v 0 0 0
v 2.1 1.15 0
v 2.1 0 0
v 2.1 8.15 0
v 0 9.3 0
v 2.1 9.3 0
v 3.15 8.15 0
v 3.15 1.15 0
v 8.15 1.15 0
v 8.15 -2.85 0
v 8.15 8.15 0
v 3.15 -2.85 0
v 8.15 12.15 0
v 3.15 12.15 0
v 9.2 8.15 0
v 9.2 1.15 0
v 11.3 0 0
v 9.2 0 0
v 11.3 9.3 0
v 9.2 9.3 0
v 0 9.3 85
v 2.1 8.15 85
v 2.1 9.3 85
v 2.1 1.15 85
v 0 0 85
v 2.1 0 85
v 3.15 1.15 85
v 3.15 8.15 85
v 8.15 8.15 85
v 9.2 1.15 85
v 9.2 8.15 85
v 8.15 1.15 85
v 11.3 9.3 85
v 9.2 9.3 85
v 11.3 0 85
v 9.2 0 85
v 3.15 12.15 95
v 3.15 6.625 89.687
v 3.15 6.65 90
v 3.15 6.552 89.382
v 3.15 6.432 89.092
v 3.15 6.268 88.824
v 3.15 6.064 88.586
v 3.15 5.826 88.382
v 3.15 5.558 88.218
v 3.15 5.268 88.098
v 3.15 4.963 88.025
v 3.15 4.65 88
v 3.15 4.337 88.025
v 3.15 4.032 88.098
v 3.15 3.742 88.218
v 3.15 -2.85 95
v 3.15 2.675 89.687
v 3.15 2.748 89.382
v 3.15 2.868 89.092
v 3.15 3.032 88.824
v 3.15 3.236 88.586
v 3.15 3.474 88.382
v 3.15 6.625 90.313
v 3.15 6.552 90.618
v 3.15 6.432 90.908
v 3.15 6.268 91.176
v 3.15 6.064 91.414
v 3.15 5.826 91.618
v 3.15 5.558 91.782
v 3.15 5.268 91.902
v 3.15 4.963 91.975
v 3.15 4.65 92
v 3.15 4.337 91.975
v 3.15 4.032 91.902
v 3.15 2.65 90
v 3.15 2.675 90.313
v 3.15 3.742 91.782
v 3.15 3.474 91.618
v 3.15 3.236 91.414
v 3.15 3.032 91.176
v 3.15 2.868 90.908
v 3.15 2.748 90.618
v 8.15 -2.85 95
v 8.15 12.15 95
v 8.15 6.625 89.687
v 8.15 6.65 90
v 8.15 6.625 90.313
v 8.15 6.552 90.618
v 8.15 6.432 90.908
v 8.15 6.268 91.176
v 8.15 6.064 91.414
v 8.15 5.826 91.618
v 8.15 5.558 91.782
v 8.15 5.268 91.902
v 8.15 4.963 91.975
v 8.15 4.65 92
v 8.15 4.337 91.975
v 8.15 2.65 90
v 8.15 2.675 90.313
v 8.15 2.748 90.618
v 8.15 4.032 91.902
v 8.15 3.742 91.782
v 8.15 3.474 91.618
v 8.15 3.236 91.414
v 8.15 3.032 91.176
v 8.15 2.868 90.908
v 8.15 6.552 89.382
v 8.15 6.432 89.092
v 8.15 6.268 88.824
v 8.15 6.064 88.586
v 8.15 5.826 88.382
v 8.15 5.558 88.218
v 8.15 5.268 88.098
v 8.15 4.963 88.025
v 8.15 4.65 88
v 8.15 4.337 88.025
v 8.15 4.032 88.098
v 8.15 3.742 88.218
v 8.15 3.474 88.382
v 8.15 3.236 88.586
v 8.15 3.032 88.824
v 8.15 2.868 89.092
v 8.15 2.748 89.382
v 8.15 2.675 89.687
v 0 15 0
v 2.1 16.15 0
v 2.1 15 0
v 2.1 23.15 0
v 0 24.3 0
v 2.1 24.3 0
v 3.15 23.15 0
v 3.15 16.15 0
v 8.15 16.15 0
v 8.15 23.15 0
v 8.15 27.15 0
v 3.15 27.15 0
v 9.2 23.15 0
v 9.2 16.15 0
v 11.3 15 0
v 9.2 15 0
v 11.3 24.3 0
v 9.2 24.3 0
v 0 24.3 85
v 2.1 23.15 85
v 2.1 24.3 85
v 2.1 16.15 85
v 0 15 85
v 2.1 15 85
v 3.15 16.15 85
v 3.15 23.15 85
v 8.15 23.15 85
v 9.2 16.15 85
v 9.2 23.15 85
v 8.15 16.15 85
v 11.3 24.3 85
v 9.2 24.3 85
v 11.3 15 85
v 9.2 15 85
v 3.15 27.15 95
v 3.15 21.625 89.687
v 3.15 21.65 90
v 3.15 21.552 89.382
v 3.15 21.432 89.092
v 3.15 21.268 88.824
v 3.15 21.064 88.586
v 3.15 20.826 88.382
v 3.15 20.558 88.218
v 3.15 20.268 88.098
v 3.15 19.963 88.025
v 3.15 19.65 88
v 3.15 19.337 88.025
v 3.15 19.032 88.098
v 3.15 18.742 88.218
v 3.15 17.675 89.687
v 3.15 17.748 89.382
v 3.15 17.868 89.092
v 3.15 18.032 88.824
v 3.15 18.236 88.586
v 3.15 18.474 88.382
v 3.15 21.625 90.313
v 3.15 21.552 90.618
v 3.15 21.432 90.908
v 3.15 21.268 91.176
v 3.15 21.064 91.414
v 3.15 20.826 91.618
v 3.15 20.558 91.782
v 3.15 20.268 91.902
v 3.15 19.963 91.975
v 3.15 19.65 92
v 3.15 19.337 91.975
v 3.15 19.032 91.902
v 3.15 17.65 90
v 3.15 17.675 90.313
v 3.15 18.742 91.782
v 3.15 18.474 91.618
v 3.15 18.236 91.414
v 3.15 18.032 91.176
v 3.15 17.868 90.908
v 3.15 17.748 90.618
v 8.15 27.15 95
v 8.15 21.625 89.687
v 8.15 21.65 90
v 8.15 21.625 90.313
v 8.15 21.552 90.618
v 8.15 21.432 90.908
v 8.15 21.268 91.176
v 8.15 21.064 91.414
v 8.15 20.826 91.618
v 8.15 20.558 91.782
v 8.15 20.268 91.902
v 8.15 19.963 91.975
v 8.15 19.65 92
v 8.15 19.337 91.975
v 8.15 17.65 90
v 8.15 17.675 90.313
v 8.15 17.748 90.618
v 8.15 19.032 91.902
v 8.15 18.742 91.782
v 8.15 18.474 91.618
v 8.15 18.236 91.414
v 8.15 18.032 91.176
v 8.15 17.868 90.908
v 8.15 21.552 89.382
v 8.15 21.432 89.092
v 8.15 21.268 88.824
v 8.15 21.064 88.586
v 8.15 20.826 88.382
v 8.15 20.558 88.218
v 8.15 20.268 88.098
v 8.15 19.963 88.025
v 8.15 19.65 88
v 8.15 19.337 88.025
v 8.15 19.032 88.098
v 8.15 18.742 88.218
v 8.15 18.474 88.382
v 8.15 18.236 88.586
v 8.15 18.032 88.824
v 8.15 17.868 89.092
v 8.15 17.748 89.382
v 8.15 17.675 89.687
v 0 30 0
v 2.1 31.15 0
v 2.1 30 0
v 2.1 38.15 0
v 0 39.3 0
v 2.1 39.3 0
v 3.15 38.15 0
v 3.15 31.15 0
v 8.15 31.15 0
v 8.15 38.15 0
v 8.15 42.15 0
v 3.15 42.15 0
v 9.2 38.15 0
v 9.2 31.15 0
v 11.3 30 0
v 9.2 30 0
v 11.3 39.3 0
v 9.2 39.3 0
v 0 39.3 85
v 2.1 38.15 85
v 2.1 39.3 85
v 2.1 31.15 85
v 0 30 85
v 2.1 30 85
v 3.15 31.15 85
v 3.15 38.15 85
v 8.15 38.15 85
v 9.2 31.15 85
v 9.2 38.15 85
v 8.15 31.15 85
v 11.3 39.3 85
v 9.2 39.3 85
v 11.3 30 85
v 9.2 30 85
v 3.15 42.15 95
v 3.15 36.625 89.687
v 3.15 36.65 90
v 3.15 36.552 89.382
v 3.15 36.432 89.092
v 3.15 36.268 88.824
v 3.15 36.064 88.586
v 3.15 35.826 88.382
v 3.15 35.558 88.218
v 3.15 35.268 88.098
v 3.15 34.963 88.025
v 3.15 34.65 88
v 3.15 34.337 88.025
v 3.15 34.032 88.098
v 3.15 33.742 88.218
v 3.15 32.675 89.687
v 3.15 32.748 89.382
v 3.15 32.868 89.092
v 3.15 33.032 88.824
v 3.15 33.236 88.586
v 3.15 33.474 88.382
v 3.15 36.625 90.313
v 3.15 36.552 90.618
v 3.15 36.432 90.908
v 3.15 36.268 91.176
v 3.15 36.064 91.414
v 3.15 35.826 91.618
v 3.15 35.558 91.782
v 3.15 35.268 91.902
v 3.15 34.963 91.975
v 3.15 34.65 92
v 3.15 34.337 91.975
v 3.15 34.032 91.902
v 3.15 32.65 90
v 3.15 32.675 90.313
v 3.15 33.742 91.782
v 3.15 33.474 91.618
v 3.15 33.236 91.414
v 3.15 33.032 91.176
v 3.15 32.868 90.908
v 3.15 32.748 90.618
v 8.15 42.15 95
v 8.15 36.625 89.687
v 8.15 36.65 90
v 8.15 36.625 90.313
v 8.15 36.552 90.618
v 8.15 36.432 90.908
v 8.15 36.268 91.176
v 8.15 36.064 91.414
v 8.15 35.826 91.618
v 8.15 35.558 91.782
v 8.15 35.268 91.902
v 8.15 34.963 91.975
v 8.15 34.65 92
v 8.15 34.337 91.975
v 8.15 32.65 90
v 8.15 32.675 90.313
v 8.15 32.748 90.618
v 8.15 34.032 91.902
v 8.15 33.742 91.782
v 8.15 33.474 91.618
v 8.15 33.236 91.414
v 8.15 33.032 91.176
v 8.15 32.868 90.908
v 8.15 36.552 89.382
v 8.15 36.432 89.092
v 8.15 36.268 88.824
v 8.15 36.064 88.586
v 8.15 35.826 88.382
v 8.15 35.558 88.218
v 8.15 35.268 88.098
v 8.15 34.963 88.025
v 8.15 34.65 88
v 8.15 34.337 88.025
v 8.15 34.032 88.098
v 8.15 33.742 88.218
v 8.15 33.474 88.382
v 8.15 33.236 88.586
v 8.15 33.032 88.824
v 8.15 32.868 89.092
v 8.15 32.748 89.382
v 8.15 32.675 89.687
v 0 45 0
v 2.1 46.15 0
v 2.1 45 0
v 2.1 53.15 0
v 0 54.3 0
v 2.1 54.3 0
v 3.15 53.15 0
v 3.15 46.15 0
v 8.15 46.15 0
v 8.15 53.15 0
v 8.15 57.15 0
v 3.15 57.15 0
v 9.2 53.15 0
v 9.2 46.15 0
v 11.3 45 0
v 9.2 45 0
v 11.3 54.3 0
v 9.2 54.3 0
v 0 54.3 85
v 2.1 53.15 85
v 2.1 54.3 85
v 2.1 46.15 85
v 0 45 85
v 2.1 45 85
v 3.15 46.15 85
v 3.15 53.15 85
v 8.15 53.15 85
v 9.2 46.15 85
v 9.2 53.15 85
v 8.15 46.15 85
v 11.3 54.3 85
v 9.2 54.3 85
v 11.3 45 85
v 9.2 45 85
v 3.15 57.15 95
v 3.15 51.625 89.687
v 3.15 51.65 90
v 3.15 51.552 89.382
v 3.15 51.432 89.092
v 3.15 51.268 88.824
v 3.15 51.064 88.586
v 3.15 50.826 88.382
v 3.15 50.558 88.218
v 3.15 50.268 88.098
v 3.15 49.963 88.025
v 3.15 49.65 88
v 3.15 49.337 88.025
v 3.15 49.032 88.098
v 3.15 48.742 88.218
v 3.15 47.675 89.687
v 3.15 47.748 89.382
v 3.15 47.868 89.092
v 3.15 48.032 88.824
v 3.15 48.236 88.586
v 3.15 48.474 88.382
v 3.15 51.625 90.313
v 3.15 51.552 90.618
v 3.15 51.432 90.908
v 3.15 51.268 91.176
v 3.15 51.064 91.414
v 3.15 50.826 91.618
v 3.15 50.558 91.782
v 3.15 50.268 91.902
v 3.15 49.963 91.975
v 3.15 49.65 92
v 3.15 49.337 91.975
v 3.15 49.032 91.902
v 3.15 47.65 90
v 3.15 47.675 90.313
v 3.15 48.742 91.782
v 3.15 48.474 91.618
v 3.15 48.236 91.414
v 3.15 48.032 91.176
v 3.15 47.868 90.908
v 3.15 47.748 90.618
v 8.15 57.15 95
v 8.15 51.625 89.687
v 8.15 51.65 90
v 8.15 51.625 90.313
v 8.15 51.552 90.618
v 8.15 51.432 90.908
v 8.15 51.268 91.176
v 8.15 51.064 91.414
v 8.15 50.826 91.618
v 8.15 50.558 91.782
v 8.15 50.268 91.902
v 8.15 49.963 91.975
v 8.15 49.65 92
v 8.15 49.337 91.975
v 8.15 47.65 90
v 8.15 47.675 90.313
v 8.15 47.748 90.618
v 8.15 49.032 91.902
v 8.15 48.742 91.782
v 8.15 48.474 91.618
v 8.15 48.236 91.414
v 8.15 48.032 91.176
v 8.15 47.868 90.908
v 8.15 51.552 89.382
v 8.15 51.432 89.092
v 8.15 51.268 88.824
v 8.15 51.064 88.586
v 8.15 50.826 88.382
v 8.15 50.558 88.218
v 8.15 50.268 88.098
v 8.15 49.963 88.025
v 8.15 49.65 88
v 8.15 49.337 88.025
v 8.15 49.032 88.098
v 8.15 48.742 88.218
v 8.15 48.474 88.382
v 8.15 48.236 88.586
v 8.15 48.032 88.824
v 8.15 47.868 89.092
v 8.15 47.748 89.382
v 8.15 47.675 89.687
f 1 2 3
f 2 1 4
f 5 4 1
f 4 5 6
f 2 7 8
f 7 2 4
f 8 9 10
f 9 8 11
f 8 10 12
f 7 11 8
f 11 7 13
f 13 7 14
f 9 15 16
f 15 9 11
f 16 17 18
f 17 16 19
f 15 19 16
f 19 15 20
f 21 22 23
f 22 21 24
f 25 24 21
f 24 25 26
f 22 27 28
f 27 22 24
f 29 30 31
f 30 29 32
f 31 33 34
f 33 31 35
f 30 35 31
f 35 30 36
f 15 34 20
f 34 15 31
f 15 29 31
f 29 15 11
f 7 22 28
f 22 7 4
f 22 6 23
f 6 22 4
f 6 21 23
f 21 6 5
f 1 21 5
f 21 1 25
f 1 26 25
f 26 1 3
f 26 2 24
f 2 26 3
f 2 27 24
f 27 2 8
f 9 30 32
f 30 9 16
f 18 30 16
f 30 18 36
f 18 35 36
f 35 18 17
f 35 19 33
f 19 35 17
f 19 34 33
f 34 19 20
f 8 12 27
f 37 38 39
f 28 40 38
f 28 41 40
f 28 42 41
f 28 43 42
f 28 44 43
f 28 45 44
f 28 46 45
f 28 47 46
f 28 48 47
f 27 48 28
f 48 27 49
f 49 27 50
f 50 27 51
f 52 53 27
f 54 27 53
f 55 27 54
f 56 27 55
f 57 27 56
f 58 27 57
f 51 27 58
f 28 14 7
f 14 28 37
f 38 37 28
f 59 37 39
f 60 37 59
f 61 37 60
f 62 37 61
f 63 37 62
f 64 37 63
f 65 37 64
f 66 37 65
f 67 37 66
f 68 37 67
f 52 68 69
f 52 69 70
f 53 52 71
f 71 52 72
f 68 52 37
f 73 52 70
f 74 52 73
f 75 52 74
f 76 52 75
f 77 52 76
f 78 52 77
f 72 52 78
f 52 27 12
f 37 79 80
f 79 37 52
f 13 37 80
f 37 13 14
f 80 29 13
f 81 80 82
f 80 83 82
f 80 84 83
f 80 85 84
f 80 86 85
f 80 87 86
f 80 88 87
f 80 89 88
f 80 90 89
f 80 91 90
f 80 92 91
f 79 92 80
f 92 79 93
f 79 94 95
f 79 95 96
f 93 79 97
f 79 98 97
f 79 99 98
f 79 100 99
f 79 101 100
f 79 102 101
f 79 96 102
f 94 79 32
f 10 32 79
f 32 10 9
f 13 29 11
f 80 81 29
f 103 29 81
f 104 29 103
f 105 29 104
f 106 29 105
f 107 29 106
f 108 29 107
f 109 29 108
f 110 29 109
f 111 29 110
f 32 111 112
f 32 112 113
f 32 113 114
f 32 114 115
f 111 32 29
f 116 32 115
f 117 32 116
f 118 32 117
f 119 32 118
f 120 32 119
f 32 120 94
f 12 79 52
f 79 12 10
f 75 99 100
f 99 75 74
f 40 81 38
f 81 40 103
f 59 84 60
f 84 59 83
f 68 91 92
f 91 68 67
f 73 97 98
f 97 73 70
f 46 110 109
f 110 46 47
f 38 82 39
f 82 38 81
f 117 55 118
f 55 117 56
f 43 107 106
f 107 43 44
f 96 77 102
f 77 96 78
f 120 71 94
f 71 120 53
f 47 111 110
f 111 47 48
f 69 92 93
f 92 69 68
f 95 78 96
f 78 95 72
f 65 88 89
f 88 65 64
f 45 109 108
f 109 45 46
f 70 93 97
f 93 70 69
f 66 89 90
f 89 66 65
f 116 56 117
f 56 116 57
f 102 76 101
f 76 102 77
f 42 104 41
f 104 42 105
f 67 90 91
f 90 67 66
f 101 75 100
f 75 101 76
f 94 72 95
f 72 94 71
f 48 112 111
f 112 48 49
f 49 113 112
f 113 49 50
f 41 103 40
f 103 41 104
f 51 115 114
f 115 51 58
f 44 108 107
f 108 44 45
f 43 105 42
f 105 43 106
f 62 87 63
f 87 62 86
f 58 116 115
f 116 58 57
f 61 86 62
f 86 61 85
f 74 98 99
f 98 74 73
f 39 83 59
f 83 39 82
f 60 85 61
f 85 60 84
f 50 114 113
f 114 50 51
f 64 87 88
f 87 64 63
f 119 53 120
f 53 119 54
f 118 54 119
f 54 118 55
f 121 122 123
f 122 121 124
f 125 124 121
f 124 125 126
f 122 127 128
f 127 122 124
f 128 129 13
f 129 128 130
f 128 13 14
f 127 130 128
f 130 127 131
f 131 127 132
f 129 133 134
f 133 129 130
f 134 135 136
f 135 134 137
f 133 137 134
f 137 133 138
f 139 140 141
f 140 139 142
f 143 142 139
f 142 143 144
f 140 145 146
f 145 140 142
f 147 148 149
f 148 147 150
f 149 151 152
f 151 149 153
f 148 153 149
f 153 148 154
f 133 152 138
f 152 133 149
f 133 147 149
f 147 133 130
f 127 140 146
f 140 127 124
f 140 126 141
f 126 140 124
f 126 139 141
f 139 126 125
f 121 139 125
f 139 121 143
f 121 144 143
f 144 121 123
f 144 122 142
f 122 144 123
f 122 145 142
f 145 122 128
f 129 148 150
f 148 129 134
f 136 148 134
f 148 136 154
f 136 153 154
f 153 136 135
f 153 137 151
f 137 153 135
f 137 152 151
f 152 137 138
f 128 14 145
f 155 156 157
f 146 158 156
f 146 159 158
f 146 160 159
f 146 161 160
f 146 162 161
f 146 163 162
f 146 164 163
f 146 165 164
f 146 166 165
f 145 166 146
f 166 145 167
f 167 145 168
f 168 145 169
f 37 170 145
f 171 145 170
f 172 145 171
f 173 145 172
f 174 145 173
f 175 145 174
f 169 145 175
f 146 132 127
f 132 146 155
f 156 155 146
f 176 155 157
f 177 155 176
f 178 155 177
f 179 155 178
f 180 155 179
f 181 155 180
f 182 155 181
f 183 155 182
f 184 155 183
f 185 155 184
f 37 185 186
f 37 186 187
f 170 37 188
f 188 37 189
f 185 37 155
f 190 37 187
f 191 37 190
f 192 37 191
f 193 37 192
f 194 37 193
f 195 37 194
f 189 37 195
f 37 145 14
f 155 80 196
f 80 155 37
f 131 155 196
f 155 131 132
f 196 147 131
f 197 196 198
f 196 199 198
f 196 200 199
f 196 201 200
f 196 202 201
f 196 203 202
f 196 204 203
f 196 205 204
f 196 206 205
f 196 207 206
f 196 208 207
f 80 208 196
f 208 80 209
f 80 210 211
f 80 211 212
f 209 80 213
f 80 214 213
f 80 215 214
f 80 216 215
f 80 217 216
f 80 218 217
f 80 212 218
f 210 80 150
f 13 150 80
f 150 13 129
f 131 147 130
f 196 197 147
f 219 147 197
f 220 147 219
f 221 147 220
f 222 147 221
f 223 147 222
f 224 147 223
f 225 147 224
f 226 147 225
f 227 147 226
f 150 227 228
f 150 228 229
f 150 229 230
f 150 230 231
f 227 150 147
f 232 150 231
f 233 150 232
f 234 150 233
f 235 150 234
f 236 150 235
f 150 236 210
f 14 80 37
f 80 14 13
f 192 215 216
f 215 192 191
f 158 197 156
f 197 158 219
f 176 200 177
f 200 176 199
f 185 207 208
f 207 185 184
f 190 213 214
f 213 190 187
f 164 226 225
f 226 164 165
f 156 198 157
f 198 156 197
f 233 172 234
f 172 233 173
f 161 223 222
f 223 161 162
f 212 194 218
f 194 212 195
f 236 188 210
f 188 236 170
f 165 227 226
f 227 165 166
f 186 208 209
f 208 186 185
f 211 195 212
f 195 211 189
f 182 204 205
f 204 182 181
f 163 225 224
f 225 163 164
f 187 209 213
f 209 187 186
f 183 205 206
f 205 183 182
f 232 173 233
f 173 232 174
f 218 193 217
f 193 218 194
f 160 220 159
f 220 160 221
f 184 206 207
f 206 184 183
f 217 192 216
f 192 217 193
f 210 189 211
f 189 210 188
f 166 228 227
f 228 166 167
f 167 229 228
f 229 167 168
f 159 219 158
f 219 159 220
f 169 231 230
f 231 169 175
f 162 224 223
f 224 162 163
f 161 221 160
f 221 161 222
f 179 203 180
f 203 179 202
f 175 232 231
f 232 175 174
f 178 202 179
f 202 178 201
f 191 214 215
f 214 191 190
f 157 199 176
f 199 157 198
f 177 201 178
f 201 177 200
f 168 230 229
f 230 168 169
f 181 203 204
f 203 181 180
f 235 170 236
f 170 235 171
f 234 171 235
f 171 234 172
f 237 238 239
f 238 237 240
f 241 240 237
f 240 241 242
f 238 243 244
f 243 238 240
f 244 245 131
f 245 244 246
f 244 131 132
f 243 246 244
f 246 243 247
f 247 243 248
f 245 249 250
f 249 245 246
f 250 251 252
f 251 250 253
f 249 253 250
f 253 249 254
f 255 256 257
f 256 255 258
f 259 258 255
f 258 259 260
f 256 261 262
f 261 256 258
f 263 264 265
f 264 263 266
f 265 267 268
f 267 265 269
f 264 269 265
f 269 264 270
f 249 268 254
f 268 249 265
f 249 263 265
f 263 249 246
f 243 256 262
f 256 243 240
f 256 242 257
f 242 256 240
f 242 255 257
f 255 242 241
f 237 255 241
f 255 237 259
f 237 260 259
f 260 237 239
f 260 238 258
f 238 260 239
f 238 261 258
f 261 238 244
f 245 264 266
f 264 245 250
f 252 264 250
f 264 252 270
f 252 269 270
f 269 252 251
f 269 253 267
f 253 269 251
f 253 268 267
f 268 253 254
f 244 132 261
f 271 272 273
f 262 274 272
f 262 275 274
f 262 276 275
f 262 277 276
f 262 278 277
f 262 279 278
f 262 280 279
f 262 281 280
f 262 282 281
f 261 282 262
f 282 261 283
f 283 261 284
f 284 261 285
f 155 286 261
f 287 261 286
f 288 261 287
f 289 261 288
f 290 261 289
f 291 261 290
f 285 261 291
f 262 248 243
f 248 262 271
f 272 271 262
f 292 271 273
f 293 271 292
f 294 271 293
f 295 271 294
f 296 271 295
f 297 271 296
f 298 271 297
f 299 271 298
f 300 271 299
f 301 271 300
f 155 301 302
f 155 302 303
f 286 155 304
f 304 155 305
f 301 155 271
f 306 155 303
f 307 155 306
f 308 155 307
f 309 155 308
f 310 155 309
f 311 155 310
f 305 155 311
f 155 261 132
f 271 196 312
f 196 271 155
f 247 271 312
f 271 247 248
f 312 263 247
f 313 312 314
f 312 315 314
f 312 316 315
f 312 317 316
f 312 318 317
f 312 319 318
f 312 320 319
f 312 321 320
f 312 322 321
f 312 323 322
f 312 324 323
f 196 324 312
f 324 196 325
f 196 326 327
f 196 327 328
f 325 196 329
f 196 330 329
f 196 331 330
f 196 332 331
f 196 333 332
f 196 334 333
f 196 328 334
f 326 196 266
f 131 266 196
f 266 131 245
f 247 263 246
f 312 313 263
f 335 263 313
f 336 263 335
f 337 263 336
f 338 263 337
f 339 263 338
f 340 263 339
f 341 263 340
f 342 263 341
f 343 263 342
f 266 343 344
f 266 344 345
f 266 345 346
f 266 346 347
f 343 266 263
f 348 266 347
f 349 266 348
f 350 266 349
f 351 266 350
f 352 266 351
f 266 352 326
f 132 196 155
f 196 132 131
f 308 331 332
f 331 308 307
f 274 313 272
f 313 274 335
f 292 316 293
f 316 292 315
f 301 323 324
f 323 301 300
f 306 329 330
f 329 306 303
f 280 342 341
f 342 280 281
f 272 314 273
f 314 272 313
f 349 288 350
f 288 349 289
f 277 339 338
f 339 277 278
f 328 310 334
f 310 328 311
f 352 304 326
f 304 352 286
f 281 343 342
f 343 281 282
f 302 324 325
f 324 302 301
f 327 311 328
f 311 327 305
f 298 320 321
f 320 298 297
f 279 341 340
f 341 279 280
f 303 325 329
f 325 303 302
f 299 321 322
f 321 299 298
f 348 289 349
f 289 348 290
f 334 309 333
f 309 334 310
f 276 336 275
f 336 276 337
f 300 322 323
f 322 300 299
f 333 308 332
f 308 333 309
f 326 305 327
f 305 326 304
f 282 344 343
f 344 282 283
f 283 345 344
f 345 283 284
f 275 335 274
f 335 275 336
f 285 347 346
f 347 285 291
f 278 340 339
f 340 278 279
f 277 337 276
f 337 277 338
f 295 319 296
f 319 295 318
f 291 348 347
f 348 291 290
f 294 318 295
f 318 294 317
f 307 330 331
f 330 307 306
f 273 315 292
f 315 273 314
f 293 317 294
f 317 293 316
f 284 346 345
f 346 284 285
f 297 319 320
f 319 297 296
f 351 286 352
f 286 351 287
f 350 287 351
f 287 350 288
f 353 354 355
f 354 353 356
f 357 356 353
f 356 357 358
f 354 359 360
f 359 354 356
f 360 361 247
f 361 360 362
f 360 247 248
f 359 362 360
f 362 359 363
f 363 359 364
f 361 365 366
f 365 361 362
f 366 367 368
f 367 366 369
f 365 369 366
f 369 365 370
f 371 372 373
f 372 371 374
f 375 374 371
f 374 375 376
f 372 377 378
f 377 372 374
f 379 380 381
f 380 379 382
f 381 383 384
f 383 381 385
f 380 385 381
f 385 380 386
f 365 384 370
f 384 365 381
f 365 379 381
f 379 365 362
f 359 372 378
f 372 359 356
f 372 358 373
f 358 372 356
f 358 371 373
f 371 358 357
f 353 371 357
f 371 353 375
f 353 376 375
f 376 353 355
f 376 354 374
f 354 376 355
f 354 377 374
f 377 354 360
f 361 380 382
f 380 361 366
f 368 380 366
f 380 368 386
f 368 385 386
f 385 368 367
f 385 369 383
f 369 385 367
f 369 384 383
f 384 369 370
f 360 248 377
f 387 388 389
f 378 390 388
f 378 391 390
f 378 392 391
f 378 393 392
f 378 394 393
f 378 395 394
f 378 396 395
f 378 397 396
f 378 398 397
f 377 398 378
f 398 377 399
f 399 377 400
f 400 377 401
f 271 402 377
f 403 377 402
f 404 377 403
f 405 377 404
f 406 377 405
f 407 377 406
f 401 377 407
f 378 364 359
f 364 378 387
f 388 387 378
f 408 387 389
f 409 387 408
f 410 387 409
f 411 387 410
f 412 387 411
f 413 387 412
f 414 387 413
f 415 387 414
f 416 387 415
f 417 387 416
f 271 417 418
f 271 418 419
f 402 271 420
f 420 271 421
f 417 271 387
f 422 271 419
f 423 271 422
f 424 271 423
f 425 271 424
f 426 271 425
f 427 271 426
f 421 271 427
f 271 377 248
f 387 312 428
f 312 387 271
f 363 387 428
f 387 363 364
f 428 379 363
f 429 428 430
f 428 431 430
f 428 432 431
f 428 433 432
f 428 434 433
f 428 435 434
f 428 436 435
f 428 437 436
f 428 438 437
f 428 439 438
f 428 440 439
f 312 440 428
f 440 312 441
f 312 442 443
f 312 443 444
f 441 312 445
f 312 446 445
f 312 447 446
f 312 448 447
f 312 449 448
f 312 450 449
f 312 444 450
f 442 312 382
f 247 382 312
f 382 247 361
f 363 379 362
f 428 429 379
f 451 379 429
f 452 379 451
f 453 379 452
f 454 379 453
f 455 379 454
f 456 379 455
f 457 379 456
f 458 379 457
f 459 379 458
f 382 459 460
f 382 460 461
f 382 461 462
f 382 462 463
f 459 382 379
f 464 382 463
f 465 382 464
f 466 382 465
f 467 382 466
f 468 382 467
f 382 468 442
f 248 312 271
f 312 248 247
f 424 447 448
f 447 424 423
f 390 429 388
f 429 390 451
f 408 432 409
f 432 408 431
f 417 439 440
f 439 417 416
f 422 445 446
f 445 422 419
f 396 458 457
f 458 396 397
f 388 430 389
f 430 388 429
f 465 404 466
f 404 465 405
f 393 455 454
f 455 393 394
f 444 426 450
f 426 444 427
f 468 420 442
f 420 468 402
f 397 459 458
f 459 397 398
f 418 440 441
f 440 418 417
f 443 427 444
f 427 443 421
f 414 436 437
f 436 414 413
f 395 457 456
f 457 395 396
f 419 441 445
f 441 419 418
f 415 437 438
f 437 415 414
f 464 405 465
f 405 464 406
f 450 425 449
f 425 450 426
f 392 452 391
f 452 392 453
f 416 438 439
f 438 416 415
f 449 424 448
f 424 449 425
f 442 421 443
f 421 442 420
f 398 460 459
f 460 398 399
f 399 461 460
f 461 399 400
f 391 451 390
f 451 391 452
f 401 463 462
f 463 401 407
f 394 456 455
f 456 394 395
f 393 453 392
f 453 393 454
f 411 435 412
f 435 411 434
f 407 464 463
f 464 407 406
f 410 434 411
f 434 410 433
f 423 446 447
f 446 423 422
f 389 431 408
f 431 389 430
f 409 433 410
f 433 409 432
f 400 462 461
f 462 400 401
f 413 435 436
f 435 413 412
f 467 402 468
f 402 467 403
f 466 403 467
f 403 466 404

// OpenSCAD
flange_width = 9.3;
flange_thickness = 2.1;
flange_neck = 7.0;
plate_thickness = 5;
plate_width = 15;
flange_height = 85;
plate_height = 95;
pairs = 4;

hole_diameter = 4;
$fn=40;

module set() {
    linear_extrude(flange_height) {
        square([flange_thickness, flange_width]);
        translate([0, (flange_width - flange_neck) / 2]) {
            square([plate_thickness + flange_thickness * 3, flange_neck]);
        }
        translate([plate_thickness + 2 * flange_thickness, 0]) {
            square([flange_thickness, flange_width]);
        }
    }
    linear_extrude(plate_height) {
        translate([
            flange_thickness * 1.5, 
            (plate_width - flange_width) / -2
        ]) {
            square([plate_thickness, plate_width]);
        }
    }
}

for(i = [0:pairs - 1]) {
    translate([0, i * plate_width]) {
        difference() {
            set();
        
            translate([
                0,
                flange_width / 2,
                flange_height + (plate_height - flange_height) / 2
            ]) {
                rotate([0,90,0]) {
                    cylinder(
                        d=hole_diameter, 
                        h=flange_thickness * 2 + plate_thickness
                    );
                }
            }
        }
    }
}
